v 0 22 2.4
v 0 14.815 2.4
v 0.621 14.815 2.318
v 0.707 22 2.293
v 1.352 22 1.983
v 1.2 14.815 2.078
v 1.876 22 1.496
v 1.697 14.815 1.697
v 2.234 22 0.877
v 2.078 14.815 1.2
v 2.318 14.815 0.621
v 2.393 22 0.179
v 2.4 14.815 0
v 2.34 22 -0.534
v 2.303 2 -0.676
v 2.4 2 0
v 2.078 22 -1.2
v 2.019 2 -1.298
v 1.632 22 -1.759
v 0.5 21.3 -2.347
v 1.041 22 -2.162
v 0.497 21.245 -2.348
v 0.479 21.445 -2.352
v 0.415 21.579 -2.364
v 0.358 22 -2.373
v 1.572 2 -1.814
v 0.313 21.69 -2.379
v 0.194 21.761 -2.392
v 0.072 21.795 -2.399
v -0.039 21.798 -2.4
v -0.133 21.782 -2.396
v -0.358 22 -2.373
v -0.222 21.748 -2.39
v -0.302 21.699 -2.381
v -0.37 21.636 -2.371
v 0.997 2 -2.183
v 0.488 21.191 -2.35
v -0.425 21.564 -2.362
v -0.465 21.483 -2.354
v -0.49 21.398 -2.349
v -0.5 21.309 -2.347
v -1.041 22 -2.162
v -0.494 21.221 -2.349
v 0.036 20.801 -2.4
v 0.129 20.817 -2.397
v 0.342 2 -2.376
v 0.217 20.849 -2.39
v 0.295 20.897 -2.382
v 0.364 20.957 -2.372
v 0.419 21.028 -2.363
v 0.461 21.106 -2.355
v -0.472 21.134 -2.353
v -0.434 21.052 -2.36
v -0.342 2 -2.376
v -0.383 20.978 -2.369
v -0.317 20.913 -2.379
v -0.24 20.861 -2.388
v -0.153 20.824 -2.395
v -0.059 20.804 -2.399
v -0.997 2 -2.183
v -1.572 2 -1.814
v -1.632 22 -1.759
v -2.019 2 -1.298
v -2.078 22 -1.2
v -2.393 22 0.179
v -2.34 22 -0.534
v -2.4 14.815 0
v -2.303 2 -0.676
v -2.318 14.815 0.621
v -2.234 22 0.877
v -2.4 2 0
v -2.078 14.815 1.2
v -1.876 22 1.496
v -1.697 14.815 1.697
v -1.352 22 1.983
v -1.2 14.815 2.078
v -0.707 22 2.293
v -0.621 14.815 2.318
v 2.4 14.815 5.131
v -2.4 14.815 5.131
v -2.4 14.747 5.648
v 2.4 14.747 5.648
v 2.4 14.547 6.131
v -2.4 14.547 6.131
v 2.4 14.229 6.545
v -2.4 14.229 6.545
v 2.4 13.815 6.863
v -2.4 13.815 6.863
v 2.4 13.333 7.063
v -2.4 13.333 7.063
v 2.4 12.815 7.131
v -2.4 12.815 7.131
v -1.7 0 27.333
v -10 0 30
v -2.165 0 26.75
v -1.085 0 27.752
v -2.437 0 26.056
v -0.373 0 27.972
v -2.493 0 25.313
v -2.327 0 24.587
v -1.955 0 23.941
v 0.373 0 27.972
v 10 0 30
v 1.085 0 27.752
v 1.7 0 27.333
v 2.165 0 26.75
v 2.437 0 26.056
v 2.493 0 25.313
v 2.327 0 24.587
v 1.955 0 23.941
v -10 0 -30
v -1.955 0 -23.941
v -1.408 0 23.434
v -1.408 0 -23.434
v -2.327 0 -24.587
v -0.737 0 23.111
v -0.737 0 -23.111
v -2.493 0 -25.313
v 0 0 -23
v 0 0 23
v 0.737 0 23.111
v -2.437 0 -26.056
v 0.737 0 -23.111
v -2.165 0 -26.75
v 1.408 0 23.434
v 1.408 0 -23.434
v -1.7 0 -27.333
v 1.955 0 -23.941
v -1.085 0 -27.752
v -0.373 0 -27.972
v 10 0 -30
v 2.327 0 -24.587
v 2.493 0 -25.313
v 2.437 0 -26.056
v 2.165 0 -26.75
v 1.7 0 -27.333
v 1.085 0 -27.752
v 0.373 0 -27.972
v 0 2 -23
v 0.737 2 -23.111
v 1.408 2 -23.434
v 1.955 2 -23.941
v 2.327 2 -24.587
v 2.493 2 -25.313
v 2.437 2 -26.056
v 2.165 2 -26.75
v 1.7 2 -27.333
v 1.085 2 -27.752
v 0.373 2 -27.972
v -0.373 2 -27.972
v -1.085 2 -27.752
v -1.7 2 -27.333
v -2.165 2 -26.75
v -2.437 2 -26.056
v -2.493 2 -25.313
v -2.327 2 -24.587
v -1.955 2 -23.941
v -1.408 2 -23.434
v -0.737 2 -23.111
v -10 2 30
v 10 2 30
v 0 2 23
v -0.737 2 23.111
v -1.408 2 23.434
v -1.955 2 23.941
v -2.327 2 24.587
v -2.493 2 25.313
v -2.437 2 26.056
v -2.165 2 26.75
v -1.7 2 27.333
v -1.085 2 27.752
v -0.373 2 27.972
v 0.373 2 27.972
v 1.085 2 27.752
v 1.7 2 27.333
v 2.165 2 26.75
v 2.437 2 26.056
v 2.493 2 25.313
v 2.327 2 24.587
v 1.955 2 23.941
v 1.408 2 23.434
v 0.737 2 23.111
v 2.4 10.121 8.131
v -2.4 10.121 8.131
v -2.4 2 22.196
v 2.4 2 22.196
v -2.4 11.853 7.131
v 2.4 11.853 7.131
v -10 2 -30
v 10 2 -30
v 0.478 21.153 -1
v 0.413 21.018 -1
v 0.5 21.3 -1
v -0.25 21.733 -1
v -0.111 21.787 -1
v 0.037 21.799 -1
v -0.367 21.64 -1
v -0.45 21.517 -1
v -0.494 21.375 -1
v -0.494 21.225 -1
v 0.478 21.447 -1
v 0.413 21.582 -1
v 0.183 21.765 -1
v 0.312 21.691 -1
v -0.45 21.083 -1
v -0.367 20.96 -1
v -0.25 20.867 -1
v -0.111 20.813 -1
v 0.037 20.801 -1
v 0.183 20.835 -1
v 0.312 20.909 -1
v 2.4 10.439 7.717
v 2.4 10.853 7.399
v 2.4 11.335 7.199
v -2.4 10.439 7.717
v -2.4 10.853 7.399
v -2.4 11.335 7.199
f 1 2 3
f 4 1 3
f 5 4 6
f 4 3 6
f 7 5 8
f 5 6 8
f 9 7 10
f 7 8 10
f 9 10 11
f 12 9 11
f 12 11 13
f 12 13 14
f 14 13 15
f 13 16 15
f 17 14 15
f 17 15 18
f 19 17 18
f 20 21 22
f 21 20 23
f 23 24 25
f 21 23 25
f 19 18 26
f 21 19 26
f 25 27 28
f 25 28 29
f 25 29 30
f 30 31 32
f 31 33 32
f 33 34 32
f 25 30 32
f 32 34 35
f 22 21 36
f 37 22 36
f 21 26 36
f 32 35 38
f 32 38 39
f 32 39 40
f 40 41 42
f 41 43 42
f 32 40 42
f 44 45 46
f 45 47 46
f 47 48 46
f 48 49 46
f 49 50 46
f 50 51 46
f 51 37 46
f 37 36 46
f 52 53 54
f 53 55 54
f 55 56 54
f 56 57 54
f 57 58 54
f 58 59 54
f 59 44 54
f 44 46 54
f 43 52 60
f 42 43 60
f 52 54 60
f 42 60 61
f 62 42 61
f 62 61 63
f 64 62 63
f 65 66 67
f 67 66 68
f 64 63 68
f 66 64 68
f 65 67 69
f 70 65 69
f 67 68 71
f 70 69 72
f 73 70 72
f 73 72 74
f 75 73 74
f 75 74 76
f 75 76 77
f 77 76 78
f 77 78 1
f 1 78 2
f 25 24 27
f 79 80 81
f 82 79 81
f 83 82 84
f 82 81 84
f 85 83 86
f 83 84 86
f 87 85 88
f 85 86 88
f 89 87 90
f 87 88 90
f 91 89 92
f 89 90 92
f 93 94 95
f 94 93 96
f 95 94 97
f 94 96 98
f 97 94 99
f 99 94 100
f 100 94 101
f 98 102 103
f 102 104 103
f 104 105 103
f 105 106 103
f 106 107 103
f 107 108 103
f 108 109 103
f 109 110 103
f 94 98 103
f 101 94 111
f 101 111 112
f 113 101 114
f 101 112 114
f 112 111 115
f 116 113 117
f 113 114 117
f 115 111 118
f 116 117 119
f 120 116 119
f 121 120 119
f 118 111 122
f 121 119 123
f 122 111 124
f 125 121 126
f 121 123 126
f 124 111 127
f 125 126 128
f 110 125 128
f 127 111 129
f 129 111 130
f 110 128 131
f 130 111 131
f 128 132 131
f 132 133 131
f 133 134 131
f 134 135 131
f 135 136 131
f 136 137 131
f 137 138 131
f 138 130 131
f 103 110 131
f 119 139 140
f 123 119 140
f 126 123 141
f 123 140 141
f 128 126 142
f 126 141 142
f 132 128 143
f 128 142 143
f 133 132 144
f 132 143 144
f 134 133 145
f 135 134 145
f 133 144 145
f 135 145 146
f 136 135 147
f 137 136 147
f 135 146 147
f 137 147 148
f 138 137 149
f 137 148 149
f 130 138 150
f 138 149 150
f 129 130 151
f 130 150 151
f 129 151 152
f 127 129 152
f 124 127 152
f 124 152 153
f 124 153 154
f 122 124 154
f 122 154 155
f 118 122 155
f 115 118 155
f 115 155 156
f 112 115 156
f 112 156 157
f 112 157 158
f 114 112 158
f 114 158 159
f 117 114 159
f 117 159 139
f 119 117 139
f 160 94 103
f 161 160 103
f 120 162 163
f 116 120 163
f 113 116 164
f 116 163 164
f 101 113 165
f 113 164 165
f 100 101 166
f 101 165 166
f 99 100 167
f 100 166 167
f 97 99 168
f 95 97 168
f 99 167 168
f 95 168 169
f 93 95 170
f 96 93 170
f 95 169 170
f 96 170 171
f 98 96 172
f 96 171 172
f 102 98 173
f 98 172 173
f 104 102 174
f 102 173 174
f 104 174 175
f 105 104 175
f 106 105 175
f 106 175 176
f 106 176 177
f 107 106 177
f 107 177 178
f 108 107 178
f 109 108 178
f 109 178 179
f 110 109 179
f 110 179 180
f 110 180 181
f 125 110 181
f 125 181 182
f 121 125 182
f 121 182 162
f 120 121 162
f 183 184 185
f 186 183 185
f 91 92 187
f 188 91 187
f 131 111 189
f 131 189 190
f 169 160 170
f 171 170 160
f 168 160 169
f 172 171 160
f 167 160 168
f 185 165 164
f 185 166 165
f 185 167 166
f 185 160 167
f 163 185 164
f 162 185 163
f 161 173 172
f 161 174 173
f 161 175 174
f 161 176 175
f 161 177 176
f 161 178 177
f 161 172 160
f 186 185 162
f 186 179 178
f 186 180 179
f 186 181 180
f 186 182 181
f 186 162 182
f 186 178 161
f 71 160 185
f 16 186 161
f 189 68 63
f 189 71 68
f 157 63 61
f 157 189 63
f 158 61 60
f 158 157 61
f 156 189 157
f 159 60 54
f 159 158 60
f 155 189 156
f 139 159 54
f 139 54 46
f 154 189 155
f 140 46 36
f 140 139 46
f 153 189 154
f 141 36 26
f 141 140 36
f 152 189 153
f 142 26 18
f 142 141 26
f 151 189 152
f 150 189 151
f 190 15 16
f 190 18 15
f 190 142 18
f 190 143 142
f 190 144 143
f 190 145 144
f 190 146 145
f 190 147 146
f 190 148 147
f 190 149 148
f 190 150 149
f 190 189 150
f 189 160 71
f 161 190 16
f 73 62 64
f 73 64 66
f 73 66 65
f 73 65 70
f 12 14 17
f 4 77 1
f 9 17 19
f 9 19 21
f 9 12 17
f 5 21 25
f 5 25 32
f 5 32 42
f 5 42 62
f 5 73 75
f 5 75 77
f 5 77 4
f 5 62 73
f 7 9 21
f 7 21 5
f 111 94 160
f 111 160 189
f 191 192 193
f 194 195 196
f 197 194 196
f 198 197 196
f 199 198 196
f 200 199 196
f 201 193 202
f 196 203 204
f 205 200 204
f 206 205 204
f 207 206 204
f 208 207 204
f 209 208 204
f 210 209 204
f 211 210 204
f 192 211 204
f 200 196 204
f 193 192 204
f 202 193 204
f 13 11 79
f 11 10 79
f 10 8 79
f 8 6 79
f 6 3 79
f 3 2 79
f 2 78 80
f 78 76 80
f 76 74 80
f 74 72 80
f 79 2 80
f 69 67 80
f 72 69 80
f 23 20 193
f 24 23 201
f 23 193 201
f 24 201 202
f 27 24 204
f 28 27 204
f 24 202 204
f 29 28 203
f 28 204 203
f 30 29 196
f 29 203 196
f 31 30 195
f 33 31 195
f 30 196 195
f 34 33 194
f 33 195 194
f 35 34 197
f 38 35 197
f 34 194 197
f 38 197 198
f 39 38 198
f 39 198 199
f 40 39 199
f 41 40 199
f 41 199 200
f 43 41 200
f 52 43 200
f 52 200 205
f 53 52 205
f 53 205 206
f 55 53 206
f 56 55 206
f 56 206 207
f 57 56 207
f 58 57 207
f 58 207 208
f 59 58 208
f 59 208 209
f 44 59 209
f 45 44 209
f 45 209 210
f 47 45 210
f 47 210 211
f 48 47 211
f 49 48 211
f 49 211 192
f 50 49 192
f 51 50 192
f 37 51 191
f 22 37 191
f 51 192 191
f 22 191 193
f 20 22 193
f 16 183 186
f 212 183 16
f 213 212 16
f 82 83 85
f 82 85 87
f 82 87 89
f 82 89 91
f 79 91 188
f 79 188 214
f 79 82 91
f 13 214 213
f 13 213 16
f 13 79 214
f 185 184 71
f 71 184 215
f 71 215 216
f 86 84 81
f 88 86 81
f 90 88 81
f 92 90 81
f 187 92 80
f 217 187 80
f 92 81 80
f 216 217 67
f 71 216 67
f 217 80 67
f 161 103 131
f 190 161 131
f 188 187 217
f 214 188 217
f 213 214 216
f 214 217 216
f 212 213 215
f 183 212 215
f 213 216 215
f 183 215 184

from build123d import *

# Parameters (mm, degrees)
SKETCH1_W           = 20
SKETCH1_H           = 60
BOSS_EXTRUDE1_DEPTH = 2
SKETCH2_R           = 2.5
CUT_EXTRUDE1_DEPTH  = 32.685959036
SKETCH3_R           = 2.4
BOSS_EXTRUDE2_DEPTH = 20
BOSS_EXTRUDE7_DEPTH = 4.8
CUT_EXTRUDE2_START  = -1
SKETCH5_R           = 0.5
CUT_EXTRUDE2_DEPTH  = 2


with BuildPart() as part:
    # Sketch1 → Boss-Extrude1 (new body)
    with BuildSketch(Plane(origin=(0, 0, 0), x_dir=(1, 0, 0), z_dir=(0, 1, 0))):
        Rectangle(SKETCH1_W, SKETCH1_H)
    extrude(amount=BOSS_EXTRUDE1_DEPTH)

    # Sketch2 → Cut-Extrude1 (cut, through all)
    with BuildSketch(Plane(origin=(0, 2, 0), x_dir=(1, 0, 0), z_dir=(0, 1, 0))):
        with Locations(Location((0, 25.5, 0), (0, 0, 270))):
            Circle(SKETCH2_R)
        with Locations(Location((0, -25.5, 0), (0, 0, 90))):
            Circle(SKETCH2_R)
    extrude(amount=-CUT_EXTRUDE1_DEPTH, mode=Mode.SUBTRACT)

    # Sketch3 → Boss-Extrude2 (add)
    with BuildSketch(Plane(origin=(0, 2, 0), x_dir=(1, 0, 0), z_dir=(0, 1, 0))):
        with Locations(Location((0, 0, 0), (0, 0, 270))):
            Circle(SKETCH3_R)
    extrude(amount=BOSS_EXTRUDE2_DEPTH)

    # Sketch4 → Boss-Extrude7 (add)
    with BuildSketch(Plane.ZY.offset(2.4)):
        with BuildLine():
            Line((8.130845775, 10.120752848), (22.196402304, 2))
            Line((22.196402304, 2), (0, 2))
            Line((0, 2), (0, 14.815098845))
            Line((0, 14.815098845), (5.130845775, 14.815098845))
            ThreePointArc((5.130845775, 14.815098845), (6.545059338, 14.229312408), (7.130845775, 12.815098845))
            Line((7.130845775, 12.815098845), (7.130845775, 11.852803656))
            ThreePointArc((7.130845775, 11.852803656), (7.398794968, 10.852803656), (8.130845775, 10.120752848))
        make_face()
    extrude(amount=-BOSS_EXTRUDE7_DEPTH)

    # Sketch5 → Cut-Extrude2 (cut)
    with BuildSketch(Plane.XY.offset(CUT_EXTRUDE2_START)):
        with Locations((0, 21.3)):
            Circle(SKETCH5_R)
    extrude(amount=-CUT_EXTRUDE2_DEPTH, mode=Mode.SUBTRACT)


solid = part.part
